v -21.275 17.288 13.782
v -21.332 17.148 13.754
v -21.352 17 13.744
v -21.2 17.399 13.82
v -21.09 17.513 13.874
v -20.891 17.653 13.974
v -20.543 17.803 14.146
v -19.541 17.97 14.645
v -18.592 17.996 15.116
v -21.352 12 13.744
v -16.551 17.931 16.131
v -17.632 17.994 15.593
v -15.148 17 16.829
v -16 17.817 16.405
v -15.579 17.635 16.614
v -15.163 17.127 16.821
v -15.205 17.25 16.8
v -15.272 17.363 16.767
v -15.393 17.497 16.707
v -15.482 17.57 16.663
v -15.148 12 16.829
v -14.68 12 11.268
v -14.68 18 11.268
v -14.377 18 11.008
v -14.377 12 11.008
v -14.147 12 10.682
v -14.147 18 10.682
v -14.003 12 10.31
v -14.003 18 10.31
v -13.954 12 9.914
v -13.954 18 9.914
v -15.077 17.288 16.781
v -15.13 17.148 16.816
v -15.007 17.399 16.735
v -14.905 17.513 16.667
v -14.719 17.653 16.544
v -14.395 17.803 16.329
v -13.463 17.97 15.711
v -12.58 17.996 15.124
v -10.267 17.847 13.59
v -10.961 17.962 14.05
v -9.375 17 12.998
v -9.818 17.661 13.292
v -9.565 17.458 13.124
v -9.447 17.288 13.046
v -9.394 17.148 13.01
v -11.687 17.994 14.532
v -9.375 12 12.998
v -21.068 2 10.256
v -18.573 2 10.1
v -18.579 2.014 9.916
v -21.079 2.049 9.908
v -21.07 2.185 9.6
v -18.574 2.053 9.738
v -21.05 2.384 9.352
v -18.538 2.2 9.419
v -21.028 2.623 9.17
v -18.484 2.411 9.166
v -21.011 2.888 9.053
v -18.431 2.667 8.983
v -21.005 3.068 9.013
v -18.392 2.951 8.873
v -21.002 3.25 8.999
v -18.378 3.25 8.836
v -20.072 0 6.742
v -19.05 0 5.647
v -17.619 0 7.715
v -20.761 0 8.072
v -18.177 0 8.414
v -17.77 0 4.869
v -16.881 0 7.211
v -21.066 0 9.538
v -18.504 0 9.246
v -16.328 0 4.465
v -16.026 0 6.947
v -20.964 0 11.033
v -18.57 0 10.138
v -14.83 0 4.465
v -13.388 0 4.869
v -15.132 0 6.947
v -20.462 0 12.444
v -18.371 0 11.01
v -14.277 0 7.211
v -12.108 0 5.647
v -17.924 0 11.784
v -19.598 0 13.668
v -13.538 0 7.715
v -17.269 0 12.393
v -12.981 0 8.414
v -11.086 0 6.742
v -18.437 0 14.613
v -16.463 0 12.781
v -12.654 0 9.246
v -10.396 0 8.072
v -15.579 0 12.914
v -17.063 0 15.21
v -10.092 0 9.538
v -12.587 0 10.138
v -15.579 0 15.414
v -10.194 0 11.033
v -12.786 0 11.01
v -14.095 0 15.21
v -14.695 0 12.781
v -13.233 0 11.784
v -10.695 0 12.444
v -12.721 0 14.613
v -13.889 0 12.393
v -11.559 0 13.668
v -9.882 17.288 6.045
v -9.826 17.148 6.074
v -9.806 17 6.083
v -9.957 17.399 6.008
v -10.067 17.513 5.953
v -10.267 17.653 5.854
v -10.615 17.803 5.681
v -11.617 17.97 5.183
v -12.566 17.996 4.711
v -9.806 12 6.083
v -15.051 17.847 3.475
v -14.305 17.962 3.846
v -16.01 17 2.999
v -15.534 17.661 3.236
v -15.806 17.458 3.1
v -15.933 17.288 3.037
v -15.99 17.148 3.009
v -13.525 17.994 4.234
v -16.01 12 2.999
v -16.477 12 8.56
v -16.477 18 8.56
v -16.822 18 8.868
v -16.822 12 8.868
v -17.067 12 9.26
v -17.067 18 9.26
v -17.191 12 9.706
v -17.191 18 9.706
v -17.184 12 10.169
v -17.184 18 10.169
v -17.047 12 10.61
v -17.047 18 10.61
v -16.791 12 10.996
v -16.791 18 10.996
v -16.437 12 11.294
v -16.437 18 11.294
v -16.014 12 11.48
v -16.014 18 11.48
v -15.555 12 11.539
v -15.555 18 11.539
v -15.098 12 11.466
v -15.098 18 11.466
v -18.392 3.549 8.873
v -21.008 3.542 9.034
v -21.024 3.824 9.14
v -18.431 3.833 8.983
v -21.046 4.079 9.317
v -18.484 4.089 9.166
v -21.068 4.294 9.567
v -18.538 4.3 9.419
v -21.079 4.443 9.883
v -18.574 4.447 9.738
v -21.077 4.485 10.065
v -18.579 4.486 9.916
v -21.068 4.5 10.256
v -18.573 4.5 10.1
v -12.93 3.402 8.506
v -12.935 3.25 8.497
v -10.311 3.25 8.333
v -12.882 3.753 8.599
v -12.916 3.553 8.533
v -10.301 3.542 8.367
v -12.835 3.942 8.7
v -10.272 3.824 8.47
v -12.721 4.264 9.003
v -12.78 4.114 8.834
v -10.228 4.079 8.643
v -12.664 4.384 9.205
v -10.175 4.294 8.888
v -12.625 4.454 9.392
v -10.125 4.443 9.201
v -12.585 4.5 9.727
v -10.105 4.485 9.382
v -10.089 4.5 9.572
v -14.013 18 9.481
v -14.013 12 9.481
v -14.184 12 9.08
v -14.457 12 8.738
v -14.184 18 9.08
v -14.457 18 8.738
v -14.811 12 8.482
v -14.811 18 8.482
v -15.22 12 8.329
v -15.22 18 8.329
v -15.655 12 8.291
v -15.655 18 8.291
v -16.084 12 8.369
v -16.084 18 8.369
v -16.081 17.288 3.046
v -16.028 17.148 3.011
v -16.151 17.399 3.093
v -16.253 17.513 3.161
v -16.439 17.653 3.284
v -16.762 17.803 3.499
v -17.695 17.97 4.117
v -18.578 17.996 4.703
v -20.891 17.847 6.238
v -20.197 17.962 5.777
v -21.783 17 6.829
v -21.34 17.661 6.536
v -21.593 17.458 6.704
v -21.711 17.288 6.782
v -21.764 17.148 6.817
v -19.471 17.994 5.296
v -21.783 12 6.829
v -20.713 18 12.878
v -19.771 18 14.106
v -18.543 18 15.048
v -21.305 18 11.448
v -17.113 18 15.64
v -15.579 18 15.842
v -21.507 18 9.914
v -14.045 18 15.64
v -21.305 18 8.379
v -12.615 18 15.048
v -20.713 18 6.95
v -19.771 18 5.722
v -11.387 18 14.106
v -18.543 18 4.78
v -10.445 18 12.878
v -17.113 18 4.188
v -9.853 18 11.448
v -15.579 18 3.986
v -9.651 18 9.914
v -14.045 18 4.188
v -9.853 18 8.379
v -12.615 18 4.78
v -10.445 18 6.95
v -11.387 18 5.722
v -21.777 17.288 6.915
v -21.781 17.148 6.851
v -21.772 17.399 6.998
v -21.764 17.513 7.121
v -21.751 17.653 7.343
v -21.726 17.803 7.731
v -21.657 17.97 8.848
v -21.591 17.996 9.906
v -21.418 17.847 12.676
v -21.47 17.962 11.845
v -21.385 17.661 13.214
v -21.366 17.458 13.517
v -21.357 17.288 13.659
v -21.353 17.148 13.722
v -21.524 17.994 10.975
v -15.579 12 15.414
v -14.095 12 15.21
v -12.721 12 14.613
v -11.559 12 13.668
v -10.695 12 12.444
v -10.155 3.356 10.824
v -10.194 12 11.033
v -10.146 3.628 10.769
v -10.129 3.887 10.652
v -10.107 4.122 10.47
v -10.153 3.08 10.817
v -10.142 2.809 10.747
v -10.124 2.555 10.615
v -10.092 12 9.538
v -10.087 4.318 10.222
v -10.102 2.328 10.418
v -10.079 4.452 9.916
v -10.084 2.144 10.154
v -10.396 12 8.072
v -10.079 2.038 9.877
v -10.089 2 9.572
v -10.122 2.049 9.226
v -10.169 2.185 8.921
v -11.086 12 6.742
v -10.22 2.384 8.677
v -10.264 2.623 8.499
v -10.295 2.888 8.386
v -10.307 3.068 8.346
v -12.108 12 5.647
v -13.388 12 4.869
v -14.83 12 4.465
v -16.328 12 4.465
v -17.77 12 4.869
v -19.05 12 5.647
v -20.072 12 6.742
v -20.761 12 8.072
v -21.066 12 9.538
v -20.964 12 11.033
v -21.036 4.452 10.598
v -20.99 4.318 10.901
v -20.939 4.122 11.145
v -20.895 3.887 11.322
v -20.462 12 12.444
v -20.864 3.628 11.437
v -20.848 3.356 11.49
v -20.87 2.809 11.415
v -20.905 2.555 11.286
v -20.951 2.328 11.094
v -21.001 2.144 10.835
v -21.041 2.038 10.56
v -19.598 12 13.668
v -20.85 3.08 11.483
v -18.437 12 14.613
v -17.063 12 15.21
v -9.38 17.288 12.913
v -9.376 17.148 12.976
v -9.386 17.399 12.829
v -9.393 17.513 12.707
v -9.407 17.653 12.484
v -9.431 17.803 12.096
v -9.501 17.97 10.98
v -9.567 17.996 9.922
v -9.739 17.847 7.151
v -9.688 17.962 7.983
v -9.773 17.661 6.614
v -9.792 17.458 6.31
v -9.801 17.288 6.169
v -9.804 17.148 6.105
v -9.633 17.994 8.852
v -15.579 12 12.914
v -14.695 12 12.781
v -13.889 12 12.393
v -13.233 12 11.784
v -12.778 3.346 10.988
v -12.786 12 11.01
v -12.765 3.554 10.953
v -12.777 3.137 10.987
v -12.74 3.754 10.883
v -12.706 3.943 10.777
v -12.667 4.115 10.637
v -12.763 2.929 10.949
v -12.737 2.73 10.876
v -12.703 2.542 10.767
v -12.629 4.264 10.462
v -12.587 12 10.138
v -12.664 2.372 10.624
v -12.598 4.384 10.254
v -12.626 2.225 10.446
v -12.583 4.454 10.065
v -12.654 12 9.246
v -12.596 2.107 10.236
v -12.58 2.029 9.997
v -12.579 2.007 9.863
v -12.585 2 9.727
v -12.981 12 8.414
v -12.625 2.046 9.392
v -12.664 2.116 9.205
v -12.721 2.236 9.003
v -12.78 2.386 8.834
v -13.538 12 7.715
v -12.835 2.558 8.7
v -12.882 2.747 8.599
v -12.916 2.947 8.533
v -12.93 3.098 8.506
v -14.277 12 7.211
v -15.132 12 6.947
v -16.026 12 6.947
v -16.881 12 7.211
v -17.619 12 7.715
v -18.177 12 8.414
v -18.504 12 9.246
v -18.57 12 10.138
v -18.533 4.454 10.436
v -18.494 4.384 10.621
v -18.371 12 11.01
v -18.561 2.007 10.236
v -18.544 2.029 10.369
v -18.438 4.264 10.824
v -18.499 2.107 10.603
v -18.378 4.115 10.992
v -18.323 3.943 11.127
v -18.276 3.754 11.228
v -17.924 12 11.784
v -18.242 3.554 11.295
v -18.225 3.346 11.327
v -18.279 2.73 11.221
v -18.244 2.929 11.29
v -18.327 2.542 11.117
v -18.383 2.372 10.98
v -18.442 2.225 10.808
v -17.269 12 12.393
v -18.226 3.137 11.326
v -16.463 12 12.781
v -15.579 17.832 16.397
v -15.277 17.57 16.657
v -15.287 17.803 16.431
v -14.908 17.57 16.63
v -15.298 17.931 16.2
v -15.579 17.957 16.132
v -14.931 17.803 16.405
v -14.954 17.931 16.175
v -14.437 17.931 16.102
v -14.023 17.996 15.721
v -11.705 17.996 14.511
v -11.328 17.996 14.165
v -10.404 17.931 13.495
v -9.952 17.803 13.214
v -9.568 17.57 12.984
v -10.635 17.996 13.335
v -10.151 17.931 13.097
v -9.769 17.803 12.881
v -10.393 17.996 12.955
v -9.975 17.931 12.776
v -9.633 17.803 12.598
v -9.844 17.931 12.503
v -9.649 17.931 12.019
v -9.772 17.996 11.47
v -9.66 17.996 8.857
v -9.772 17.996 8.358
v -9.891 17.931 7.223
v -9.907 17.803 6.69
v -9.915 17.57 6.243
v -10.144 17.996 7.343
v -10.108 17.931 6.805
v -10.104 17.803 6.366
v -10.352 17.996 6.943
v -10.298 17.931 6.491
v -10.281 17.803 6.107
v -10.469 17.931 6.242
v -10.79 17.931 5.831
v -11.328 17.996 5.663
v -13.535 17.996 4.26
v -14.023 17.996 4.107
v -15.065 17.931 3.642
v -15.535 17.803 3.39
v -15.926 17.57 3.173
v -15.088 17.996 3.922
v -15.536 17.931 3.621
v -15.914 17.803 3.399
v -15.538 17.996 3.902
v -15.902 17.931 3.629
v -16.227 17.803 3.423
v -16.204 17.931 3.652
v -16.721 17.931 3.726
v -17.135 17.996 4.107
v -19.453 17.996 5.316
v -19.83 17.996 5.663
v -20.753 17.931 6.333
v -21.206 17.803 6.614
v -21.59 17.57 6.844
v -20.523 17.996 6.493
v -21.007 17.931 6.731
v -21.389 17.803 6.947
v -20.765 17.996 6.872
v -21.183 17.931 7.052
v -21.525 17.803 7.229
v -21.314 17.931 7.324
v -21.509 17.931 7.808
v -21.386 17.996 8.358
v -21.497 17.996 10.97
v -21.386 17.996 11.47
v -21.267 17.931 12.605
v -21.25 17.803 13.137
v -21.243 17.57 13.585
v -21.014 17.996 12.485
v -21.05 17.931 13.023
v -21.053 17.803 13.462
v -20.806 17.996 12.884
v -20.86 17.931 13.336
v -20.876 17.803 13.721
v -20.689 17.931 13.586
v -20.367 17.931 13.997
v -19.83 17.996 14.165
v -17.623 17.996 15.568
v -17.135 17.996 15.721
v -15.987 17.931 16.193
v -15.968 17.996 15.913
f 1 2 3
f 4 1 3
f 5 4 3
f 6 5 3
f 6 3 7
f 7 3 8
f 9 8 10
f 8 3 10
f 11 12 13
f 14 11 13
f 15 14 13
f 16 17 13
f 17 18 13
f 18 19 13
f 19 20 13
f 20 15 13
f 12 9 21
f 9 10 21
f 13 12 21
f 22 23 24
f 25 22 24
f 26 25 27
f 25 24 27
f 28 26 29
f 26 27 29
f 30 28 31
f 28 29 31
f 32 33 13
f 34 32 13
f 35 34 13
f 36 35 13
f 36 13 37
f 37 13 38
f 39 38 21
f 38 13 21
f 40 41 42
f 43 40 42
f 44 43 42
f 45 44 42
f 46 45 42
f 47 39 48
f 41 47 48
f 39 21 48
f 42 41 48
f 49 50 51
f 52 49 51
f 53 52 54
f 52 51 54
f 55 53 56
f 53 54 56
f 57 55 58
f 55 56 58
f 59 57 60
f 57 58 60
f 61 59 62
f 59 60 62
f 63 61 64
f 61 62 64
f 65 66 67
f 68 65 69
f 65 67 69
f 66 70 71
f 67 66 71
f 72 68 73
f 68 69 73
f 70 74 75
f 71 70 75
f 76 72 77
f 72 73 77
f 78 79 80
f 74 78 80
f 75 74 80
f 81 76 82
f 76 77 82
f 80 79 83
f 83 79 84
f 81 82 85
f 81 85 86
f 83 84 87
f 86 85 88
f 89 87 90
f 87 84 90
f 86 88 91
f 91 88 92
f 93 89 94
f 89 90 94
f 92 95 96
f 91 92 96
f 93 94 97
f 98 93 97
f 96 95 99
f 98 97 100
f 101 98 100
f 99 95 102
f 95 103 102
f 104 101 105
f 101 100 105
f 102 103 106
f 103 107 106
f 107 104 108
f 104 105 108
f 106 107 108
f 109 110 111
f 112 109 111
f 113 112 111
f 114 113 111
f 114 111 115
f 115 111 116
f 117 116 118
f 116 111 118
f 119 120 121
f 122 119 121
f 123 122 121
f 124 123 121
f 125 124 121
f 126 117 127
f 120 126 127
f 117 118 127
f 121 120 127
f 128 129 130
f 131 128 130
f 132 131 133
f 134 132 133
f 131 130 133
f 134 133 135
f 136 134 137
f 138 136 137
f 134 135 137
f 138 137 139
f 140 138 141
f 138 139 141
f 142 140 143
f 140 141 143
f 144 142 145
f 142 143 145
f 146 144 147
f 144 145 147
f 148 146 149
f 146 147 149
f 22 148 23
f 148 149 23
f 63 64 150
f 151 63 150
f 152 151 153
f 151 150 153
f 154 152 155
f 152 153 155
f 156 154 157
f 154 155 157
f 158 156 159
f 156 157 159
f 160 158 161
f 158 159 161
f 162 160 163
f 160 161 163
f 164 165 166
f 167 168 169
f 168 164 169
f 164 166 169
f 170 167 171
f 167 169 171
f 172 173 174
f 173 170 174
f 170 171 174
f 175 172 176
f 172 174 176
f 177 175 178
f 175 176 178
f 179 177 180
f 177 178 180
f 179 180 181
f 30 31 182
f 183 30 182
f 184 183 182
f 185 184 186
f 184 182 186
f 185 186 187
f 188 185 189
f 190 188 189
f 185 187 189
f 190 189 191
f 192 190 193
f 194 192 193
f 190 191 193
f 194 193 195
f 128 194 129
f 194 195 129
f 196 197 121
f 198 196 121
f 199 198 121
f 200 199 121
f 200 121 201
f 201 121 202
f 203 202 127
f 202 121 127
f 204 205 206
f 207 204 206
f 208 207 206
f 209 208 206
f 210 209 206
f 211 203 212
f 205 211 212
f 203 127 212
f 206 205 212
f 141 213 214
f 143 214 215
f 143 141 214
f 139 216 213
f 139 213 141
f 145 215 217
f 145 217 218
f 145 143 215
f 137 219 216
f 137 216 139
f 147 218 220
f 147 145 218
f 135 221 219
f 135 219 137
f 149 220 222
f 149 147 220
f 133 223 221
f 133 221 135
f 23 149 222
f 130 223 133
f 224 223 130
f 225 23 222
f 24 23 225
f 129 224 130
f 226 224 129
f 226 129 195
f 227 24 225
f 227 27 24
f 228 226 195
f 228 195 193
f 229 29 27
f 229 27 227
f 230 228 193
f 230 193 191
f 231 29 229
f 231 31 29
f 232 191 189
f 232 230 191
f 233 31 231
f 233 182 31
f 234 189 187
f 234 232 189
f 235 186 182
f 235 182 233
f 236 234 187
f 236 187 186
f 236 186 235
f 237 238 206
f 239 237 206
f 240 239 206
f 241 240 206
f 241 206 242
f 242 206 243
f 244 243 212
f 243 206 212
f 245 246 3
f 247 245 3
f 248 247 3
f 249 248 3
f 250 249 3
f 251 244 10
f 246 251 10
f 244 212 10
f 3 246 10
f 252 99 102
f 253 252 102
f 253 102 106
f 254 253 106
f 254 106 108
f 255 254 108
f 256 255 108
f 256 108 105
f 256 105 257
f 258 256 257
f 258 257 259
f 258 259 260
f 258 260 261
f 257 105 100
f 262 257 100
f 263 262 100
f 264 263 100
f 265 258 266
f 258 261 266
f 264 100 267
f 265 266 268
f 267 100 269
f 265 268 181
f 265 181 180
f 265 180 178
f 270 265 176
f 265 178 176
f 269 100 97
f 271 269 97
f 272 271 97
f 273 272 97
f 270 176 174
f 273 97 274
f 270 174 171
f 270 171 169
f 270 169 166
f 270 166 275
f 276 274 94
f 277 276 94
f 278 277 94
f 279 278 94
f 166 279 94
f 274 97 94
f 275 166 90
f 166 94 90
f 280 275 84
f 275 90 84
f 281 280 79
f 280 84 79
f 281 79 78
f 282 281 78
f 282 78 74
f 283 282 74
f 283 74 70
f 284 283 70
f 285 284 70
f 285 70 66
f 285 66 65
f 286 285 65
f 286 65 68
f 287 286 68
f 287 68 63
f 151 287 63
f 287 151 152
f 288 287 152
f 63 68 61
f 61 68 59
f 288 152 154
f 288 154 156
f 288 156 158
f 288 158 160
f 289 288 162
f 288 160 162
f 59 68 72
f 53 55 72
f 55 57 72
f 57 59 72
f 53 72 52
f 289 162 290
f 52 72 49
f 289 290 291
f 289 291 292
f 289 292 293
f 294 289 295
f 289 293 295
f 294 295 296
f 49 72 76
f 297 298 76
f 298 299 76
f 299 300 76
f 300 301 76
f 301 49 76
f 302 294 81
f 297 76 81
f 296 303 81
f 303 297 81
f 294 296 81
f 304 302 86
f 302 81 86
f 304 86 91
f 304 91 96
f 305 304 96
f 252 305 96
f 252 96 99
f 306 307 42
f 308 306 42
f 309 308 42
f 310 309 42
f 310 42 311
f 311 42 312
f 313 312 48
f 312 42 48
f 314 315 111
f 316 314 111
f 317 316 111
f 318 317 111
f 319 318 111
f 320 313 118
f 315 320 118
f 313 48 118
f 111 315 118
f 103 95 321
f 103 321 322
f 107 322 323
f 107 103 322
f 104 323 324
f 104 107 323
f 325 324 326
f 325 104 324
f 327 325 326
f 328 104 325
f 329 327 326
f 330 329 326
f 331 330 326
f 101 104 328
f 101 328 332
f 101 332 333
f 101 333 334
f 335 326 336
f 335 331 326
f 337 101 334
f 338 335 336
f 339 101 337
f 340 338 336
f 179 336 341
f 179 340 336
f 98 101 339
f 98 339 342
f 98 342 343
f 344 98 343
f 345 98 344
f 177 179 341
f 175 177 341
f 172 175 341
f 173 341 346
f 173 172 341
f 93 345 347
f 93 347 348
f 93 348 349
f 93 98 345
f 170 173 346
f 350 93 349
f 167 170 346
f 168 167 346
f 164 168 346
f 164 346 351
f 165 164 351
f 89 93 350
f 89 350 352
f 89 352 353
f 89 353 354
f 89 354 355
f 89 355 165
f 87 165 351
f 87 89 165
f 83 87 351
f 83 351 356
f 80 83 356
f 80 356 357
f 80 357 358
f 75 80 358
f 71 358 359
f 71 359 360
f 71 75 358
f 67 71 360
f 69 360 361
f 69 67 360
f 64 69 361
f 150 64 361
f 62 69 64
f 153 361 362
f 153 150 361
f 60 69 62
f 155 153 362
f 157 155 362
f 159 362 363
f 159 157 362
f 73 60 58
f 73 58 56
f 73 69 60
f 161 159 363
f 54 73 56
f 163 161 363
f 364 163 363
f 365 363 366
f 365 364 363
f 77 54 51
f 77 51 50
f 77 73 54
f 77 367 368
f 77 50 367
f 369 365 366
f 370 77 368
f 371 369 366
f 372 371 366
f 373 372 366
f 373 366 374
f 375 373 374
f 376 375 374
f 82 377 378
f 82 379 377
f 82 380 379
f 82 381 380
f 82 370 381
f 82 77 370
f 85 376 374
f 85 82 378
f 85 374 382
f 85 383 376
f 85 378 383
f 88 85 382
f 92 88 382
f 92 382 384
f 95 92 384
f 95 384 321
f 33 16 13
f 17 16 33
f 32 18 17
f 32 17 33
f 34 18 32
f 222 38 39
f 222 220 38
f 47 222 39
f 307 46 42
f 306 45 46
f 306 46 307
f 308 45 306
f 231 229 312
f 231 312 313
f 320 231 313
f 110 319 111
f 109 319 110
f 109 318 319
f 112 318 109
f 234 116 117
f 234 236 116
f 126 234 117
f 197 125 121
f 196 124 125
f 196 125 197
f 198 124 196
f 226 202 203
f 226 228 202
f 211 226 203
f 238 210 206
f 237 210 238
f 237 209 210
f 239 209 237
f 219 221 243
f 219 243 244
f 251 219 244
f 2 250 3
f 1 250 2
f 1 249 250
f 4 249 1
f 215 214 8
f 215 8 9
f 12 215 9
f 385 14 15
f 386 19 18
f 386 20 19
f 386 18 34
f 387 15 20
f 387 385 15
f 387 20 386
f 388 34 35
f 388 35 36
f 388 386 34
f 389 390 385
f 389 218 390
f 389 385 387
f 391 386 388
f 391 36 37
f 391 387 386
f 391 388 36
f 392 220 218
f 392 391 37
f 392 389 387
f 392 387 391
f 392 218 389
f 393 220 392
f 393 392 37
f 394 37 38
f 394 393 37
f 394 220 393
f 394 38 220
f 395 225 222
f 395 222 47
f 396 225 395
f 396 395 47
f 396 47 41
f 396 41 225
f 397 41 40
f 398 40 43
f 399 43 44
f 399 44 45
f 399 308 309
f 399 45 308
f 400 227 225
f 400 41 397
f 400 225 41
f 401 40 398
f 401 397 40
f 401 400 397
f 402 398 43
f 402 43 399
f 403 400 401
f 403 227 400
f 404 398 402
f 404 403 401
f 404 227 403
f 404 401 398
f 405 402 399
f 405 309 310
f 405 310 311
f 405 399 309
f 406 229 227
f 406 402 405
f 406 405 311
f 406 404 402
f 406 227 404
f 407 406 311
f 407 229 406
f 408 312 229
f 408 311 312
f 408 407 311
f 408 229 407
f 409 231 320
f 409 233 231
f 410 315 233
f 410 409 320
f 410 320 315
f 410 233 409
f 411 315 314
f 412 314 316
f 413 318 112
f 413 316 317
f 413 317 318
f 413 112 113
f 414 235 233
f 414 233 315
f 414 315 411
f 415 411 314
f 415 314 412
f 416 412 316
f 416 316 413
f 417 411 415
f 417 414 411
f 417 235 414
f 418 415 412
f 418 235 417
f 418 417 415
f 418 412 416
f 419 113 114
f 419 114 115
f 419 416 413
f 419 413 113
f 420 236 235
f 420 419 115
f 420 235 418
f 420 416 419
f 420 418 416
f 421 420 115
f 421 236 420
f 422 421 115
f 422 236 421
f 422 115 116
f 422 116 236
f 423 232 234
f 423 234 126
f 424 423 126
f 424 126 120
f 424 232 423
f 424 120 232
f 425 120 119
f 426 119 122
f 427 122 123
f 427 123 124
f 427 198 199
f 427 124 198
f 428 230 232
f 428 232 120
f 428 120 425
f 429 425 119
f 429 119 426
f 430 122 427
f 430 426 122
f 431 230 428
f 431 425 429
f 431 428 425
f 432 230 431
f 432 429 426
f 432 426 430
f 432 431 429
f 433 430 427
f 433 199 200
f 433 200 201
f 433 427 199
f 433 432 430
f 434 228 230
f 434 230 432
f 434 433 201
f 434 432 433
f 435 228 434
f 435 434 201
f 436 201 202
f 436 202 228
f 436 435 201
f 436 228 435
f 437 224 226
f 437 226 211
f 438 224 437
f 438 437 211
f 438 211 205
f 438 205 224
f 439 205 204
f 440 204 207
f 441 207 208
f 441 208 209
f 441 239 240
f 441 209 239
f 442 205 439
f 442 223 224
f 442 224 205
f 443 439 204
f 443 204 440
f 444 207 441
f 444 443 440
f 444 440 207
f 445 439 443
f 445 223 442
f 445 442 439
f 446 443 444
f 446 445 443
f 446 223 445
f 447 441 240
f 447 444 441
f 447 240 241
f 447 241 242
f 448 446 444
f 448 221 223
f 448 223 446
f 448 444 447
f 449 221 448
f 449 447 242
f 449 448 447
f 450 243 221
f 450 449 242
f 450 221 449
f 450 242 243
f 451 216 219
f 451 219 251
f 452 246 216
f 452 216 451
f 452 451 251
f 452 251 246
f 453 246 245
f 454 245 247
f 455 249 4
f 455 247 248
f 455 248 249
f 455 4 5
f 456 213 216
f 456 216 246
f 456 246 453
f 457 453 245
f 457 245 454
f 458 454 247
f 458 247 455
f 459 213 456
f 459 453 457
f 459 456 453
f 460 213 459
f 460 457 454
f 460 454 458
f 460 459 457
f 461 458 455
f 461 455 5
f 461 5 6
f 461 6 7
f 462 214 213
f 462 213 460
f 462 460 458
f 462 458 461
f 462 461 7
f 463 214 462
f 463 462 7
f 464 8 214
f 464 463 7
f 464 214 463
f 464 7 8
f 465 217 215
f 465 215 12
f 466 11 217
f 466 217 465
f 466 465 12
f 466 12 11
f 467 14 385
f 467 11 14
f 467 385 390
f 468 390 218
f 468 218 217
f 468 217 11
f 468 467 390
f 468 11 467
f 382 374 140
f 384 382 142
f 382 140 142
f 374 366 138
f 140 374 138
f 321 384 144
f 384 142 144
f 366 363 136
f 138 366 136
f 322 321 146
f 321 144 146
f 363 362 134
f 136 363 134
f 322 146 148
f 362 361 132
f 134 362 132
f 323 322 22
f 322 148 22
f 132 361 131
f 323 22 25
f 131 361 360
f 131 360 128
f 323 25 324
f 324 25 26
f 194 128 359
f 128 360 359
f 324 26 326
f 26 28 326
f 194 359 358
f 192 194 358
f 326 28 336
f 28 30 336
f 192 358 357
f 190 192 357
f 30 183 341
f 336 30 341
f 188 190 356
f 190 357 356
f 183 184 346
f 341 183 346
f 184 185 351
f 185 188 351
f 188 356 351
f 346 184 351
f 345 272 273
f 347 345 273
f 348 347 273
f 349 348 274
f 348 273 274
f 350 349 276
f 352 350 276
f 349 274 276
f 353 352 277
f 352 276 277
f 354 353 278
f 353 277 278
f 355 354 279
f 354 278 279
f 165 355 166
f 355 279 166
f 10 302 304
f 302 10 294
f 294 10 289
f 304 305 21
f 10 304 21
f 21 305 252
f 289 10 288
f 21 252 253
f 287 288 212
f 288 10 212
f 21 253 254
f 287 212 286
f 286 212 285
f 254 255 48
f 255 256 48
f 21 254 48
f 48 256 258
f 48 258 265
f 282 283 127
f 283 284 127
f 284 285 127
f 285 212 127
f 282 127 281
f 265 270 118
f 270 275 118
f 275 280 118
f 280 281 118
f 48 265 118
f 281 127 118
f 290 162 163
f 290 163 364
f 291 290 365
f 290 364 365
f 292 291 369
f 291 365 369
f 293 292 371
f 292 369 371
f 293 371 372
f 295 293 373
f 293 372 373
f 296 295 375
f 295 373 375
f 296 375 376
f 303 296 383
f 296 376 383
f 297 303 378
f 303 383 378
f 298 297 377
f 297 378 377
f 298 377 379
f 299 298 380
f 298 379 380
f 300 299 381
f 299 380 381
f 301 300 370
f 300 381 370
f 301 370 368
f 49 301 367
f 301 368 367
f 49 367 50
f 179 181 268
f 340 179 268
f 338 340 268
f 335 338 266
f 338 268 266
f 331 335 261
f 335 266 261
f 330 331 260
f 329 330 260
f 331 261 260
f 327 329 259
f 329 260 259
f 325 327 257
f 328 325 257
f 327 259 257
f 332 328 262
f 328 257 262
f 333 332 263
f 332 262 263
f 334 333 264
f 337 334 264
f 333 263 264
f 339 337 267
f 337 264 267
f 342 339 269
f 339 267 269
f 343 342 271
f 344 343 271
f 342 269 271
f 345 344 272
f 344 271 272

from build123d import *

# Parameters (mm, degrees)
SKETCH1_R           = 5.5
SKETCH1_R_2         = 3
BOSS_EXTRUDE1_DEPTH = 12
BOSS_EXTRUDE2_DEPTH = 6
CUT_EXTRUDE1_DEPTH  = 17
CUT_EXTRUDE4_DEPTH  = 22


with BuildPart() as part:
    # Sketch1 → Boss-Extrude1 (new body)
    with BuildSketch(Plane(origin=(0, 0, 0), x_dir=(1, 0, 0), z_dir=(0, 1, 0))):
        with Locations(Location((-15.57885573, -9.913817283, 0), (0, 0, 270))):
            Circle(SKETCH1_R)
        with Locations(Location((-15.57885573, -9.913817283, 0), (0, 0, 270))):
            Circle(SKETCH1_R_2, mode=Mode.SUBTRACT)
    extrude(amount=BOSS_EXTRUDE1_DEPTH)

    # Sketch2 → Boss-Extrude2 (add)
    with BuildSketch(Plane(origin=(0, 12, 0), x_dir=(1, 0, 0), z_dir=(0, 1, 0))):
        Polygon((-15.148097749, -16.828616453), (-9.375084996, -12.998169513), (-9.805842977, -6.083370343), (-16.009613711, -2.999018113), (-21.782626464, -6.829465052), (-21.351868483, -13.744264222), align=None)
    extrude(amount=BOSS_EXTRUDE2_DEPTH)

    # Sketch3 → Cut-Extrude1 (cut)
    with BuildSketch(Plane(origin=(0, 18, 0), x_dir=(1, 0, 0), z_dir=(0, 1, 0))):
        with BuildLine():
            ThreePointArc((-13.95385573, -9.913817283), (-14.810518846, -8.481936201), (-16.477281493, -8.55976553))
            Line((-16.477281493, -8.55976553), (-14.680429966, -11.267869035))
            ThreePointArc((-14.680429966, -11.267869035), (-14.146974648, -10.682154166), (-13.95385573, -9.913817283))
        make_face()
        with BuildLine():
            Line((-14.680429966, -11.267869035), (-16.477281493, -8.55976553))
            ThreePointArc((-16.477281493, -8.55976553), (-16.932907482, -10.812243046), (-14.680429966, -11.267869035))
        make_face()
    extrude(amount=-CUT_EXTRUDE1_DEPTH, mode=Mode.SUBTRACT)

    # Sketch5 → Cut-Revolve1 (revolve, cut)
    with BuildSketch(Plane(origin=(-16.133827612, 0, 1.005058114), x_dir=(0.06217455908352037, 0, 0.9980652905510591), z_dir=(-0.9980652905510591, 0, 0.06217455908352037)), mode=Mode.PRIVATE) as cut_revolve1_sk:
        with BuildLine():
            Line((15.854231671, 18), (15.854231671, 17))
            ThreePointArc((15.854231671, 17), (15.561338452, 17.707106781), (14.854231671, 18))
            Line((14.854231671, 18), (15.854231671, 18))
        make_face()
    revolve(cut_revolve1_sk.sketch.rotate(Axis((-15.57885573, 18, 9.913817283), (0, 1, 0)), 356.435361028), axis=Axis((-15.57885573, 18, 9.913817283), (0, 1, 0)), mode=Mode.SUBTRACT)

    # Sketch6 → Cut-Extrude4 (cut)
    with BuildSketch(Plane(origin=(-10.145435869, 0, 0.632010759), x_dir=(-0.06217455908352025, 0, -0.9980652905510591), z_dir=(0.9980652905510591, 0, -0.06217455908352025))):
        with BuildLine():
            ThreePointArc((-8.926028441, 4.5), (-10.176028441, 3.25), (-8.926028441, 2))
            Line((-8.926028441, 2), (-8.926028441, 4.5))
        make_face()
        with BuildLine():
            Line((-8.926028441, 4.5), (-8.926028441, 2))
            ThreePointArc((-8.926028441, 2), (-8.042144964, 2.366116524), (-7.676028441, 3.25))
            ThreePointArc((-7.676028441, 3.25), (-8.042144964, 4.133883476), (-8.926028441, 4.5))
        make_face()
    extrude(amount=-CUT_EXTRUDE4_DEPTH, mode=Mode.SUBTRACT)


solid = part.part
